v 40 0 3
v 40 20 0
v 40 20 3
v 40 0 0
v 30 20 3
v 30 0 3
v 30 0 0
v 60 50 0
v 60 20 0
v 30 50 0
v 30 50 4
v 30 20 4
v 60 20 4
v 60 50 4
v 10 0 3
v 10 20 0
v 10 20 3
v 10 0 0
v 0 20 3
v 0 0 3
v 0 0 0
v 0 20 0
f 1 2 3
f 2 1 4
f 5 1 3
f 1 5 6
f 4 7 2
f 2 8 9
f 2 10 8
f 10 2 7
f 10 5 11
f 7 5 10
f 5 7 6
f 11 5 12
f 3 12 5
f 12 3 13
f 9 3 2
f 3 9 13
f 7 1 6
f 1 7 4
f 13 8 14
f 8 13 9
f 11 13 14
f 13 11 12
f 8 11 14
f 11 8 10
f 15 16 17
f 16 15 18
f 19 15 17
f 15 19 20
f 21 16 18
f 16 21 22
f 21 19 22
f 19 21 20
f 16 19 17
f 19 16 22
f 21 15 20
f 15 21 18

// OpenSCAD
cube([10, 20, 3]);
translate([30, 0, 0]) {
	cube([10, 20, 3]);
	translate([0, 20, 0]) {
		cube([30, 30, 4]);
	}
}
